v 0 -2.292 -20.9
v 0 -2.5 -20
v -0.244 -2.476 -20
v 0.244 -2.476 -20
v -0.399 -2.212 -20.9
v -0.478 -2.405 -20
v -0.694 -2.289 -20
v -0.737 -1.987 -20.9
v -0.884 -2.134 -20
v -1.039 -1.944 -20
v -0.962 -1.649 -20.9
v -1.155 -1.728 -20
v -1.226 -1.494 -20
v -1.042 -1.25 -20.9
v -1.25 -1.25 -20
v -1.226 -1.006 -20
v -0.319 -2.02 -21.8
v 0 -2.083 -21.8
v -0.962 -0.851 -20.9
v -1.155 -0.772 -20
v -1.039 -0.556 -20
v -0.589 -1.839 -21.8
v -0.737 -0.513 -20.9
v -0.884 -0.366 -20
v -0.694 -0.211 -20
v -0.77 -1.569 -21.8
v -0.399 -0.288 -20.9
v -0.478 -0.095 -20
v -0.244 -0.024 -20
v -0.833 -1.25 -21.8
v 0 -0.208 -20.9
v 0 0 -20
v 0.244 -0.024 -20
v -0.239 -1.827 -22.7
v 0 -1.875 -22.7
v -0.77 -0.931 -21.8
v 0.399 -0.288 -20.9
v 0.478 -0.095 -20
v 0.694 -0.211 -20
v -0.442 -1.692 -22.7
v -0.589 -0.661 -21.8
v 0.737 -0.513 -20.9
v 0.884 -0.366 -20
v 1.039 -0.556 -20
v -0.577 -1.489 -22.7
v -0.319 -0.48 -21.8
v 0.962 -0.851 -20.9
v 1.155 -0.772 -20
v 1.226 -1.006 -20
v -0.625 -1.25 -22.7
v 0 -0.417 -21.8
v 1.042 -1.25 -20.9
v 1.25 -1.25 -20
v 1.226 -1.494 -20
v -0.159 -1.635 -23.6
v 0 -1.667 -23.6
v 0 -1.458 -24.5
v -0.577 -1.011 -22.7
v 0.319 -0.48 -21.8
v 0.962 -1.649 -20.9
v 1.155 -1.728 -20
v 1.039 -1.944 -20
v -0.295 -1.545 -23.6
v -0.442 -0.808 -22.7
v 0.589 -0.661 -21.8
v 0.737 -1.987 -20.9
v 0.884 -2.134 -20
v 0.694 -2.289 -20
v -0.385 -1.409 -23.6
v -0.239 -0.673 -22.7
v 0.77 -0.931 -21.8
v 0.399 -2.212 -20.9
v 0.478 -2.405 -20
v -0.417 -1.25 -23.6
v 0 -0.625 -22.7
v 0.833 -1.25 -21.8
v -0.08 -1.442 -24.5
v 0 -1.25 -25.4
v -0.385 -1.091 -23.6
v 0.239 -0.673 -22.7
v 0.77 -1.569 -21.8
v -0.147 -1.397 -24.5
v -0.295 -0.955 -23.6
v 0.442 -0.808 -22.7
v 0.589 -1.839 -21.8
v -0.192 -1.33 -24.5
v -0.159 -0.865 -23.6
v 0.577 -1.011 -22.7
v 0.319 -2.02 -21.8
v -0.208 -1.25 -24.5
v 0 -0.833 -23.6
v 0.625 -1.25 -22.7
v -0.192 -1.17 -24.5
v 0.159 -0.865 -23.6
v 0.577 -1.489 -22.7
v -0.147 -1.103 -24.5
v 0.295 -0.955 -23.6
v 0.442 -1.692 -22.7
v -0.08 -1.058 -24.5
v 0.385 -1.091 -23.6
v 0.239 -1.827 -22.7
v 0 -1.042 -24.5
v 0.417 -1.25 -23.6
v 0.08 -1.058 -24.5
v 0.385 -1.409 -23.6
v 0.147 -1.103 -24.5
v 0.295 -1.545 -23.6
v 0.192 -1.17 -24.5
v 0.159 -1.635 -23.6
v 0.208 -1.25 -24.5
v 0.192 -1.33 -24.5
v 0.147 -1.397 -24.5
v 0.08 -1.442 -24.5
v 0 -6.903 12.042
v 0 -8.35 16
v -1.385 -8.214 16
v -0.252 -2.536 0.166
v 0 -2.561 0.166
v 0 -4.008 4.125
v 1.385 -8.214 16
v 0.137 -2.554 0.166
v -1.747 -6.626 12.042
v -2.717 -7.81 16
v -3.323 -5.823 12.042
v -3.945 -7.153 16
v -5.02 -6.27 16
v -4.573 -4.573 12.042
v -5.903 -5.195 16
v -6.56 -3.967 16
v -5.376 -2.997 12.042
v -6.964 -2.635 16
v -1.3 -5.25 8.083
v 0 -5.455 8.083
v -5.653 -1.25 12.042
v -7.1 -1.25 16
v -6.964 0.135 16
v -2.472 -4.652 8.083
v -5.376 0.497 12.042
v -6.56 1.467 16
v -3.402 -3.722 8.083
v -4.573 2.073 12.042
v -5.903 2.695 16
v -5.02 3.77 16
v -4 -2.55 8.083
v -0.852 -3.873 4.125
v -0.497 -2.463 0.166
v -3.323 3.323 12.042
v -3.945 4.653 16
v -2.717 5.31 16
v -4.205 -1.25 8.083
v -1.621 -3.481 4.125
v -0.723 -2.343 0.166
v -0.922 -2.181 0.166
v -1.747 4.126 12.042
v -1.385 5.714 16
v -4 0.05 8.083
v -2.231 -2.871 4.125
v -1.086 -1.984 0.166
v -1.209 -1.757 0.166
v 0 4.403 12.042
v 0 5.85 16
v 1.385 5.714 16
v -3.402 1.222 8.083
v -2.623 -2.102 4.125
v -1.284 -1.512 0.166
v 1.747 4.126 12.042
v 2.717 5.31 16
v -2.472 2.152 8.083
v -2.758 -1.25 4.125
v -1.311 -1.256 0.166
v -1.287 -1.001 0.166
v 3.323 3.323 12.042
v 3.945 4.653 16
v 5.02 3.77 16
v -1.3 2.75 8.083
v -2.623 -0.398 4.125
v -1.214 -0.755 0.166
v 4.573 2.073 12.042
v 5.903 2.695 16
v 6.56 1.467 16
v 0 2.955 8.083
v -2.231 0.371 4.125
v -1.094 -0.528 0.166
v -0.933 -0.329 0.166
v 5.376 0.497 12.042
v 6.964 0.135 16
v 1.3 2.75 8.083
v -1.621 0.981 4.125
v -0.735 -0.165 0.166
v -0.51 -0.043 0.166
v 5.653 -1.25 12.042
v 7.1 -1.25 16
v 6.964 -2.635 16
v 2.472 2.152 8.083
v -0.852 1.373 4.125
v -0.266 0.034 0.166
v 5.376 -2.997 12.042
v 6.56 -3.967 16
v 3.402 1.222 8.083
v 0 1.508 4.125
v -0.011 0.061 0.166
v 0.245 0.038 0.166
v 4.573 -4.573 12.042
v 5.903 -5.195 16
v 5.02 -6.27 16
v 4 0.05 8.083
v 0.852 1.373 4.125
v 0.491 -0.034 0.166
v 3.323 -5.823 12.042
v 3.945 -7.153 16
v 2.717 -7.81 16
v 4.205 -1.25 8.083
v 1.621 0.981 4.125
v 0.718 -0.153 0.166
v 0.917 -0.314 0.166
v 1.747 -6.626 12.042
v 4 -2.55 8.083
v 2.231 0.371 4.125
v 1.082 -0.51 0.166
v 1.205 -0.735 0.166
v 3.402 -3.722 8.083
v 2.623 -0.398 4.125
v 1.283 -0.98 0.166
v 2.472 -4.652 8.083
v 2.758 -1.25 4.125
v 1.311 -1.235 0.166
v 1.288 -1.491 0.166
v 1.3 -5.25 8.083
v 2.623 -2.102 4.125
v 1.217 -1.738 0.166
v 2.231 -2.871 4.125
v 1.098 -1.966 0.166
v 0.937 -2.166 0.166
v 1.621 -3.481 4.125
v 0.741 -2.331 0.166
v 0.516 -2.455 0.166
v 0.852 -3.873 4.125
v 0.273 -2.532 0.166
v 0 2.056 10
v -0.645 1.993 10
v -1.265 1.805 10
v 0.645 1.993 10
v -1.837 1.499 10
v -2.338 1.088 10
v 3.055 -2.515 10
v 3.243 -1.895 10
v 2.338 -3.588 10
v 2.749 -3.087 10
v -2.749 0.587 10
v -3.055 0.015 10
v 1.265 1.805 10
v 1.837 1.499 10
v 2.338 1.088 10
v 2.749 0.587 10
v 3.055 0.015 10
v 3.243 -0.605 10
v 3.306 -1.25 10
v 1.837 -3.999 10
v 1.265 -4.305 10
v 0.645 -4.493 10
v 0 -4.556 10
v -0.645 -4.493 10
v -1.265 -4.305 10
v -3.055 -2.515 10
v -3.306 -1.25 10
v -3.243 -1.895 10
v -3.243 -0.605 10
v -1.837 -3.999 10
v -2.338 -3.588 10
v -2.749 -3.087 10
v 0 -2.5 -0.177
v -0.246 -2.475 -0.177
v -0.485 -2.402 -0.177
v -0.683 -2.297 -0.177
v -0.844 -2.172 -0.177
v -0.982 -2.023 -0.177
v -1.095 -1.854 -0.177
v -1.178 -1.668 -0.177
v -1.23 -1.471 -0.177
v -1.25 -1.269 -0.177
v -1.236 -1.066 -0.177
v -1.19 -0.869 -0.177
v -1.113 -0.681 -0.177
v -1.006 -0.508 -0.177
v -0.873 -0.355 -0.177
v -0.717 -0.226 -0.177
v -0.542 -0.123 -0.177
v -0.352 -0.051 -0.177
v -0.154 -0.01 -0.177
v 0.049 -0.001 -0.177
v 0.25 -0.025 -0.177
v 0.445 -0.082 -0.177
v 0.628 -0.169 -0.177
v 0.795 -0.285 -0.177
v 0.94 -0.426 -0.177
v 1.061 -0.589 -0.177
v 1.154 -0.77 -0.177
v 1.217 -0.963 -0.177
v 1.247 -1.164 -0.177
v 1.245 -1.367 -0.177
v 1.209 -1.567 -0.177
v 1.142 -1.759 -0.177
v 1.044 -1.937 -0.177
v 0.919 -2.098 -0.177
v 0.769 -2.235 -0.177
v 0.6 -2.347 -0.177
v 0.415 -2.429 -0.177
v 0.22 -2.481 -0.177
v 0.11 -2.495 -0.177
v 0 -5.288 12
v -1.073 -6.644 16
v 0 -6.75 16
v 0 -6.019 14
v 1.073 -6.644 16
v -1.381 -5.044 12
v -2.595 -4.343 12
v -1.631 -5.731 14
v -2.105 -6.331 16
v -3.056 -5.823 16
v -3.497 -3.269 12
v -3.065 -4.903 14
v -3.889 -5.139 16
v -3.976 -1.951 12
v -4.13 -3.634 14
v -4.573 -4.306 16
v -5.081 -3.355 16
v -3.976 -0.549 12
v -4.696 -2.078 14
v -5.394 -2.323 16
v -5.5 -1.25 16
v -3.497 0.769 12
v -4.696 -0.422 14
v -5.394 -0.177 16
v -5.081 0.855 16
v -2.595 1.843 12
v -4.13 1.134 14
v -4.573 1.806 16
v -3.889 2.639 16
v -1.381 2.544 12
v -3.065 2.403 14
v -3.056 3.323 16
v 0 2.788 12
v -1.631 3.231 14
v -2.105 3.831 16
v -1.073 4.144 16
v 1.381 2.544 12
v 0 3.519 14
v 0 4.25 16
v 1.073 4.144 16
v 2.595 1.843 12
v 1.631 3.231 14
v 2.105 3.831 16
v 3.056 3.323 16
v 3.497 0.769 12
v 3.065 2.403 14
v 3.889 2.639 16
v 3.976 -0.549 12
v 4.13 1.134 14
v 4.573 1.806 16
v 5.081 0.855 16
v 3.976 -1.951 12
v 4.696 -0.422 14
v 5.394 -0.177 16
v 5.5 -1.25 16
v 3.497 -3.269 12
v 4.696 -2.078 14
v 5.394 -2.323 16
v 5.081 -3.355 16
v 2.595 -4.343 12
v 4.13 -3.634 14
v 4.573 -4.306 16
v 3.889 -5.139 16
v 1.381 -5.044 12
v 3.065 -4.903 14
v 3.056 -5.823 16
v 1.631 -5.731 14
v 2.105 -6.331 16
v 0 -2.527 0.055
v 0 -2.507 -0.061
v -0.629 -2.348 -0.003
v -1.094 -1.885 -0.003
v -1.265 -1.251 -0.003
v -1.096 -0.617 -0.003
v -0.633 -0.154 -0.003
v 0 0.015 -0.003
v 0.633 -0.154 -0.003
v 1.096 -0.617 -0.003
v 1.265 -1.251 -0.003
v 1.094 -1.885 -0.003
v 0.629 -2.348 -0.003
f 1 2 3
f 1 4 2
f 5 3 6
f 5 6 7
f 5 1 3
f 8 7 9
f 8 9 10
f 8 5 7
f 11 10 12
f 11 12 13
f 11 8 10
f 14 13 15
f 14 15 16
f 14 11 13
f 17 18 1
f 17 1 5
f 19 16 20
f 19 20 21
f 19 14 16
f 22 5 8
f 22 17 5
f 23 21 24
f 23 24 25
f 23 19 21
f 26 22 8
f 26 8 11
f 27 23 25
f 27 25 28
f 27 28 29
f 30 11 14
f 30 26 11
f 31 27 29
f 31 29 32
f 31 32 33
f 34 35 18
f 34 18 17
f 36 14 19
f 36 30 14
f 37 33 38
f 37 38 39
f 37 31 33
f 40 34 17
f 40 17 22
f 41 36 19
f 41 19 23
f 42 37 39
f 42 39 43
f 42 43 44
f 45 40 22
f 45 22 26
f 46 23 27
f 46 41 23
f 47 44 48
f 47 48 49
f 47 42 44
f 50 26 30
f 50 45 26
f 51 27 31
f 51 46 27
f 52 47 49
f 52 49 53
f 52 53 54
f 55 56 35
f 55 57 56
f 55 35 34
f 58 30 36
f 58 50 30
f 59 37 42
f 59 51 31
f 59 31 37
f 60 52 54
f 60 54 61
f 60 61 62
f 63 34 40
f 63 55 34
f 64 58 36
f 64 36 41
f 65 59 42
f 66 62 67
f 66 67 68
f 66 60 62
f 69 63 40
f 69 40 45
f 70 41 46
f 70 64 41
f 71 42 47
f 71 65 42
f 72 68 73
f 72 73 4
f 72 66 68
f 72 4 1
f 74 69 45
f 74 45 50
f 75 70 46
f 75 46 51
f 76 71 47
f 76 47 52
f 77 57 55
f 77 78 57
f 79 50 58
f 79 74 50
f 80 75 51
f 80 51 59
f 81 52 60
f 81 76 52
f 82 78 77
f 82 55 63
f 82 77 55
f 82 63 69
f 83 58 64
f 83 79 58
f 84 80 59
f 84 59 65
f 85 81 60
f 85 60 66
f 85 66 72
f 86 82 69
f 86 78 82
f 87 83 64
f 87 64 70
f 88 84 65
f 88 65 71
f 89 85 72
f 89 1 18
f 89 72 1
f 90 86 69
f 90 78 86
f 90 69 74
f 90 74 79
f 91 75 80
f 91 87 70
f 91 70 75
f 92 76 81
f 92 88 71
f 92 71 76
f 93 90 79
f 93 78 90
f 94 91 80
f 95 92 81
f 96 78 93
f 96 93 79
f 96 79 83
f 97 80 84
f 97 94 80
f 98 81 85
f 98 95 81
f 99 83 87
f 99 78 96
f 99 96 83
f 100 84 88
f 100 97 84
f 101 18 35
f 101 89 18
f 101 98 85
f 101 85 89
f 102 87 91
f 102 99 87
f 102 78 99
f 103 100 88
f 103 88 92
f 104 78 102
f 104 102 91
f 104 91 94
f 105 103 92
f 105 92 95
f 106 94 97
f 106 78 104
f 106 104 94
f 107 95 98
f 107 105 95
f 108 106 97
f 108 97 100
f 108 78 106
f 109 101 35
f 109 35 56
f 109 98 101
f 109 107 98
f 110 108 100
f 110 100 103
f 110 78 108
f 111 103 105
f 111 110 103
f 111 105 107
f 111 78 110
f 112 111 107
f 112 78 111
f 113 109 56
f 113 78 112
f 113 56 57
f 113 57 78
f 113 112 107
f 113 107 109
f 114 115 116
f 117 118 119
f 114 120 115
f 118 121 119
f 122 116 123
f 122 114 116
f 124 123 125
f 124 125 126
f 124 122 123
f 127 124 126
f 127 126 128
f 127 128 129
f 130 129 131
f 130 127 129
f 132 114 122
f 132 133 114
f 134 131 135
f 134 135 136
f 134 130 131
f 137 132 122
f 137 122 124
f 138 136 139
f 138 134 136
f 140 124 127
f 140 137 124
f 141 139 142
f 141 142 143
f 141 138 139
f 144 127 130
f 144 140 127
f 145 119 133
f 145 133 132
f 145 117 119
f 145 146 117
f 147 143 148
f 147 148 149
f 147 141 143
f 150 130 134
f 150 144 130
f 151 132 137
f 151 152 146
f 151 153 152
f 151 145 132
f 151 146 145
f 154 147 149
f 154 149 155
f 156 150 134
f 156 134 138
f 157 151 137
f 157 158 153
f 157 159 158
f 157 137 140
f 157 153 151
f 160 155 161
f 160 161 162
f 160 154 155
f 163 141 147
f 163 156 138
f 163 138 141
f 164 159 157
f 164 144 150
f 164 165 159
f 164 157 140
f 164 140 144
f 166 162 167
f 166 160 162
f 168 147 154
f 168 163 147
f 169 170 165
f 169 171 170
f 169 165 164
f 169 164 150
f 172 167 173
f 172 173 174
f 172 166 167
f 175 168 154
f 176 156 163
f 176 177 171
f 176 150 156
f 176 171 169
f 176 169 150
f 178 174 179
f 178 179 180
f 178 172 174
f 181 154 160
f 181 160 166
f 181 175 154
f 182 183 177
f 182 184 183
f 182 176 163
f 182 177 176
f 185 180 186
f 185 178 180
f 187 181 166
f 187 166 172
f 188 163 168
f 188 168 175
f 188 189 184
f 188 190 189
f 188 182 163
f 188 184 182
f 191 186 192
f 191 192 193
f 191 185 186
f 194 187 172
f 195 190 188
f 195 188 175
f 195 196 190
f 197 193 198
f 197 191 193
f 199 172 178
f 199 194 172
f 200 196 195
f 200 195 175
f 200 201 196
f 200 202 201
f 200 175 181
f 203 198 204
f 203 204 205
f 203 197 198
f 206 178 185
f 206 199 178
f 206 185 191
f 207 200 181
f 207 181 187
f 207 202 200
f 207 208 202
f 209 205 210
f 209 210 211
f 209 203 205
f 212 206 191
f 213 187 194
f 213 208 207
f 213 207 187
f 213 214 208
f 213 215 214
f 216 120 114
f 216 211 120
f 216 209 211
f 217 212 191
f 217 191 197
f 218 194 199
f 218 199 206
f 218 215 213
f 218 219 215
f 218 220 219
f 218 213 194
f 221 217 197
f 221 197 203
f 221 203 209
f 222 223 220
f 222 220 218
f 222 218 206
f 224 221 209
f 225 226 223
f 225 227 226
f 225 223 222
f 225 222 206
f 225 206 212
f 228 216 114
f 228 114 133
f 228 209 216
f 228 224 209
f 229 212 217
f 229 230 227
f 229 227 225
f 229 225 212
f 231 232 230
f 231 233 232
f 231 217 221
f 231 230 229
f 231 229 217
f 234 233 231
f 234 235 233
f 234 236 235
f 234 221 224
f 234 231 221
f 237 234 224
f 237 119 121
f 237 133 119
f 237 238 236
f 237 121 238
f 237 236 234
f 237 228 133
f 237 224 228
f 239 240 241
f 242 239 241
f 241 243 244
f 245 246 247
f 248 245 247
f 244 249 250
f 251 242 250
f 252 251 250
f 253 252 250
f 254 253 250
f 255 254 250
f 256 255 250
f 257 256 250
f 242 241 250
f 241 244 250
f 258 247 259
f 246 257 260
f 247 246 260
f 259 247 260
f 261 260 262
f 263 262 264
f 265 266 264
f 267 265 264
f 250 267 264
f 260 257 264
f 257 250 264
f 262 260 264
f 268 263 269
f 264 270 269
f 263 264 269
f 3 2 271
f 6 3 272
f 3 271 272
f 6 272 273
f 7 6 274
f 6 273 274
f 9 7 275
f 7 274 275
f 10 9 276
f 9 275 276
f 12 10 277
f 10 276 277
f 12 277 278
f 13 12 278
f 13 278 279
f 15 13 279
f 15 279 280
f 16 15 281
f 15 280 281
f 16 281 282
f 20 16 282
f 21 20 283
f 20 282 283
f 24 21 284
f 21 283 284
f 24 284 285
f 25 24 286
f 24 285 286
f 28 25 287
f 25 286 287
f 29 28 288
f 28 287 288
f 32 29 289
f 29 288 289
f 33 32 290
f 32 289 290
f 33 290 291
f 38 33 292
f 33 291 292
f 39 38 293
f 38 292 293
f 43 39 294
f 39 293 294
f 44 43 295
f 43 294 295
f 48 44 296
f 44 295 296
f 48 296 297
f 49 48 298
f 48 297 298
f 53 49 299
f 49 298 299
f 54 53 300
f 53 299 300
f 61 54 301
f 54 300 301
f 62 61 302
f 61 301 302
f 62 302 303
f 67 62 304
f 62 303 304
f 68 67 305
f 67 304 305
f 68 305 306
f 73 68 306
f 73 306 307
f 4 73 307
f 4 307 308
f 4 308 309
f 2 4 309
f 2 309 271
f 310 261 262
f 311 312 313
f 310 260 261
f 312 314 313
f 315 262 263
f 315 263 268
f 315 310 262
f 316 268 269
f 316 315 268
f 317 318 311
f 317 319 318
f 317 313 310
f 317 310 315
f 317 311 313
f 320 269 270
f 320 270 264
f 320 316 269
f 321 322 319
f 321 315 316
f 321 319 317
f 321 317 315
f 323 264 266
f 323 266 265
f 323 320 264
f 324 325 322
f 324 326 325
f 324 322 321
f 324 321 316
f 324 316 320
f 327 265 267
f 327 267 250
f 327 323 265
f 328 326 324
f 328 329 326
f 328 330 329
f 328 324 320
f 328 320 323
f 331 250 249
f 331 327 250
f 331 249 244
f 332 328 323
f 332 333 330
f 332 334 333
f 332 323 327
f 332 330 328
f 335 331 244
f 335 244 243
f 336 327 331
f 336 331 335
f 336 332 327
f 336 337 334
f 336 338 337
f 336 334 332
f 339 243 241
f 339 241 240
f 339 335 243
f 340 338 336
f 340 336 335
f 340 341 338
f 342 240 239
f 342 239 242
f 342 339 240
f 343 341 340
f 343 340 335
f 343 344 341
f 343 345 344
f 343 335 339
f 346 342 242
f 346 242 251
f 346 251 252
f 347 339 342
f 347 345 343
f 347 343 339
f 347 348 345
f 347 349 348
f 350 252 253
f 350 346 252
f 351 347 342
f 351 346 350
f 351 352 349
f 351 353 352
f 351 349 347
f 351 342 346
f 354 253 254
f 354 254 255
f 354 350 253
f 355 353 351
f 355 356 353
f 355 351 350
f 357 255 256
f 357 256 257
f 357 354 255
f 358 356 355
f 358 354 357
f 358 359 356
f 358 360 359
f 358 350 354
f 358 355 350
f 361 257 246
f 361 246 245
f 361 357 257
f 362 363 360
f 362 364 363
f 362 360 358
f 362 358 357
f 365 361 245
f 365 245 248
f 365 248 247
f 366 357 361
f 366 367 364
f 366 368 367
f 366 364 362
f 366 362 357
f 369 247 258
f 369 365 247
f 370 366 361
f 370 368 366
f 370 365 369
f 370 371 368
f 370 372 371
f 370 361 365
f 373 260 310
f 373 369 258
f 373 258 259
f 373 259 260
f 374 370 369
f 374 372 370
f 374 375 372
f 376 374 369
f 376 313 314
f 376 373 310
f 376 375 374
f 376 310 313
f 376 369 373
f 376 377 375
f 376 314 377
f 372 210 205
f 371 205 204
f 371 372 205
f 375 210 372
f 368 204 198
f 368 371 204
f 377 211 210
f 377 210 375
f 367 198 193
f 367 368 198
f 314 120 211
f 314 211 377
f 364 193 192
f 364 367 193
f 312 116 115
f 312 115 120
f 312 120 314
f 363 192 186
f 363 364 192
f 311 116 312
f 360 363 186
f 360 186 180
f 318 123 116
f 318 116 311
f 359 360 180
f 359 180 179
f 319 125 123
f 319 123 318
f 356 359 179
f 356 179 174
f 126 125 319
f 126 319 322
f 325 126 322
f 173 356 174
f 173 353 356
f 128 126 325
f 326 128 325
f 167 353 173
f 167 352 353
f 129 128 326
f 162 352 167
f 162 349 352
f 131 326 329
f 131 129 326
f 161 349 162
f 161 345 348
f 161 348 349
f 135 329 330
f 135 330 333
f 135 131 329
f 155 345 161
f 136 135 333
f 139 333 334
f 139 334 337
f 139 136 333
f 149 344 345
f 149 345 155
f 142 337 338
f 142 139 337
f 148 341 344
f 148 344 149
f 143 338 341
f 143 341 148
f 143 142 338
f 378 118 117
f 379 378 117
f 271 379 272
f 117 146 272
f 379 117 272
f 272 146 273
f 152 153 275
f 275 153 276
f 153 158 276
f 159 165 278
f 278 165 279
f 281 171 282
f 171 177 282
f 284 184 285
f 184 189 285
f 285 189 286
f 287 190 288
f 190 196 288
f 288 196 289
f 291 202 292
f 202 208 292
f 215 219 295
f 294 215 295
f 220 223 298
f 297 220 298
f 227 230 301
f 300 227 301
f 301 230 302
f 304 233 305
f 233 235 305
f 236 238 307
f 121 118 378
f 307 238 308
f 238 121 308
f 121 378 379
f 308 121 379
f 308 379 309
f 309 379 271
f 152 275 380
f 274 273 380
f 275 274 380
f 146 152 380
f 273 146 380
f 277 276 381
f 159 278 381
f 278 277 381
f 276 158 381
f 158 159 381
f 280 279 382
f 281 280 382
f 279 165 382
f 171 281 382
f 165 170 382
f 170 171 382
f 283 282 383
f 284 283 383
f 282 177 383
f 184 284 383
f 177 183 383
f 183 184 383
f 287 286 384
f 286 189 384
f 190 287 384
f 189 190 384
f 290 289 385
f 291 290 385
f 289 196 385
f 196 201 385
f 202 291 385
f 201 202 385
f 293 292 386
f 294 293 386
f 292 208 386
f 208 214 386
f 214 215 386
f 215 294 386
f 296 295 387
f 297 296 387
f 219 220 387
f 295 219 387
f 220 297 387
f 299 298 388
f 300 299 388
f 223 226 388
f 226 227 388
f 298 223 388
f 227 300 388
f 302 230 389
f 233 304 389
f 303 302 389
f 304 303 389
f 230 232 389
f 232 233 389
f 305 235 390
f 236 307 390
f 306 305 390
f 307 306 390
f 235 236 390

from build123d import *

# Parameters (mm, degrees)
FILLET1_R = 1


with BuildPart() as part:
    # Sketch1 → Revolve1 (revolve)
    with BuildSketch(Plane(origin=(0, 0, 0), x_dir=(0, 0, -1), z_dir=(1, 0, 0)), mode=Mode.PRIVATE) as revolve1_sk:
        Polygon((0, 0), (-4.376068376, 0), (-10, 2.05625), (-16, 4.25), (-16, 5.85), align=None)
        Polygon((-10, 0), (-4.376068376, 0), (-10, 2.05625), align=None)
        Polygon((20, 0), (0, 0), (-4.376068376, 0), (-10, 0), (-10, -1.25), (20, -1.25), align=None)
        Polygon((25.4, -1.25), (20, -1.25), (20, 0), align=None)
    revolve(revolve1_sk.sketch.rotate(Axis((0, -1.25, 10), (0, 0, -1)), 180), axis=Axis((0, -1.25, 10), (0, 0, -1)))

    # Fillet1
    fillet1_edges = [part.edges().sort_by_distance(p)[0] for p in [
        (0, 0, 0),
    ]]
    fillet(fillet1_edges, radius=FILLET1_R)


solid = part.part
